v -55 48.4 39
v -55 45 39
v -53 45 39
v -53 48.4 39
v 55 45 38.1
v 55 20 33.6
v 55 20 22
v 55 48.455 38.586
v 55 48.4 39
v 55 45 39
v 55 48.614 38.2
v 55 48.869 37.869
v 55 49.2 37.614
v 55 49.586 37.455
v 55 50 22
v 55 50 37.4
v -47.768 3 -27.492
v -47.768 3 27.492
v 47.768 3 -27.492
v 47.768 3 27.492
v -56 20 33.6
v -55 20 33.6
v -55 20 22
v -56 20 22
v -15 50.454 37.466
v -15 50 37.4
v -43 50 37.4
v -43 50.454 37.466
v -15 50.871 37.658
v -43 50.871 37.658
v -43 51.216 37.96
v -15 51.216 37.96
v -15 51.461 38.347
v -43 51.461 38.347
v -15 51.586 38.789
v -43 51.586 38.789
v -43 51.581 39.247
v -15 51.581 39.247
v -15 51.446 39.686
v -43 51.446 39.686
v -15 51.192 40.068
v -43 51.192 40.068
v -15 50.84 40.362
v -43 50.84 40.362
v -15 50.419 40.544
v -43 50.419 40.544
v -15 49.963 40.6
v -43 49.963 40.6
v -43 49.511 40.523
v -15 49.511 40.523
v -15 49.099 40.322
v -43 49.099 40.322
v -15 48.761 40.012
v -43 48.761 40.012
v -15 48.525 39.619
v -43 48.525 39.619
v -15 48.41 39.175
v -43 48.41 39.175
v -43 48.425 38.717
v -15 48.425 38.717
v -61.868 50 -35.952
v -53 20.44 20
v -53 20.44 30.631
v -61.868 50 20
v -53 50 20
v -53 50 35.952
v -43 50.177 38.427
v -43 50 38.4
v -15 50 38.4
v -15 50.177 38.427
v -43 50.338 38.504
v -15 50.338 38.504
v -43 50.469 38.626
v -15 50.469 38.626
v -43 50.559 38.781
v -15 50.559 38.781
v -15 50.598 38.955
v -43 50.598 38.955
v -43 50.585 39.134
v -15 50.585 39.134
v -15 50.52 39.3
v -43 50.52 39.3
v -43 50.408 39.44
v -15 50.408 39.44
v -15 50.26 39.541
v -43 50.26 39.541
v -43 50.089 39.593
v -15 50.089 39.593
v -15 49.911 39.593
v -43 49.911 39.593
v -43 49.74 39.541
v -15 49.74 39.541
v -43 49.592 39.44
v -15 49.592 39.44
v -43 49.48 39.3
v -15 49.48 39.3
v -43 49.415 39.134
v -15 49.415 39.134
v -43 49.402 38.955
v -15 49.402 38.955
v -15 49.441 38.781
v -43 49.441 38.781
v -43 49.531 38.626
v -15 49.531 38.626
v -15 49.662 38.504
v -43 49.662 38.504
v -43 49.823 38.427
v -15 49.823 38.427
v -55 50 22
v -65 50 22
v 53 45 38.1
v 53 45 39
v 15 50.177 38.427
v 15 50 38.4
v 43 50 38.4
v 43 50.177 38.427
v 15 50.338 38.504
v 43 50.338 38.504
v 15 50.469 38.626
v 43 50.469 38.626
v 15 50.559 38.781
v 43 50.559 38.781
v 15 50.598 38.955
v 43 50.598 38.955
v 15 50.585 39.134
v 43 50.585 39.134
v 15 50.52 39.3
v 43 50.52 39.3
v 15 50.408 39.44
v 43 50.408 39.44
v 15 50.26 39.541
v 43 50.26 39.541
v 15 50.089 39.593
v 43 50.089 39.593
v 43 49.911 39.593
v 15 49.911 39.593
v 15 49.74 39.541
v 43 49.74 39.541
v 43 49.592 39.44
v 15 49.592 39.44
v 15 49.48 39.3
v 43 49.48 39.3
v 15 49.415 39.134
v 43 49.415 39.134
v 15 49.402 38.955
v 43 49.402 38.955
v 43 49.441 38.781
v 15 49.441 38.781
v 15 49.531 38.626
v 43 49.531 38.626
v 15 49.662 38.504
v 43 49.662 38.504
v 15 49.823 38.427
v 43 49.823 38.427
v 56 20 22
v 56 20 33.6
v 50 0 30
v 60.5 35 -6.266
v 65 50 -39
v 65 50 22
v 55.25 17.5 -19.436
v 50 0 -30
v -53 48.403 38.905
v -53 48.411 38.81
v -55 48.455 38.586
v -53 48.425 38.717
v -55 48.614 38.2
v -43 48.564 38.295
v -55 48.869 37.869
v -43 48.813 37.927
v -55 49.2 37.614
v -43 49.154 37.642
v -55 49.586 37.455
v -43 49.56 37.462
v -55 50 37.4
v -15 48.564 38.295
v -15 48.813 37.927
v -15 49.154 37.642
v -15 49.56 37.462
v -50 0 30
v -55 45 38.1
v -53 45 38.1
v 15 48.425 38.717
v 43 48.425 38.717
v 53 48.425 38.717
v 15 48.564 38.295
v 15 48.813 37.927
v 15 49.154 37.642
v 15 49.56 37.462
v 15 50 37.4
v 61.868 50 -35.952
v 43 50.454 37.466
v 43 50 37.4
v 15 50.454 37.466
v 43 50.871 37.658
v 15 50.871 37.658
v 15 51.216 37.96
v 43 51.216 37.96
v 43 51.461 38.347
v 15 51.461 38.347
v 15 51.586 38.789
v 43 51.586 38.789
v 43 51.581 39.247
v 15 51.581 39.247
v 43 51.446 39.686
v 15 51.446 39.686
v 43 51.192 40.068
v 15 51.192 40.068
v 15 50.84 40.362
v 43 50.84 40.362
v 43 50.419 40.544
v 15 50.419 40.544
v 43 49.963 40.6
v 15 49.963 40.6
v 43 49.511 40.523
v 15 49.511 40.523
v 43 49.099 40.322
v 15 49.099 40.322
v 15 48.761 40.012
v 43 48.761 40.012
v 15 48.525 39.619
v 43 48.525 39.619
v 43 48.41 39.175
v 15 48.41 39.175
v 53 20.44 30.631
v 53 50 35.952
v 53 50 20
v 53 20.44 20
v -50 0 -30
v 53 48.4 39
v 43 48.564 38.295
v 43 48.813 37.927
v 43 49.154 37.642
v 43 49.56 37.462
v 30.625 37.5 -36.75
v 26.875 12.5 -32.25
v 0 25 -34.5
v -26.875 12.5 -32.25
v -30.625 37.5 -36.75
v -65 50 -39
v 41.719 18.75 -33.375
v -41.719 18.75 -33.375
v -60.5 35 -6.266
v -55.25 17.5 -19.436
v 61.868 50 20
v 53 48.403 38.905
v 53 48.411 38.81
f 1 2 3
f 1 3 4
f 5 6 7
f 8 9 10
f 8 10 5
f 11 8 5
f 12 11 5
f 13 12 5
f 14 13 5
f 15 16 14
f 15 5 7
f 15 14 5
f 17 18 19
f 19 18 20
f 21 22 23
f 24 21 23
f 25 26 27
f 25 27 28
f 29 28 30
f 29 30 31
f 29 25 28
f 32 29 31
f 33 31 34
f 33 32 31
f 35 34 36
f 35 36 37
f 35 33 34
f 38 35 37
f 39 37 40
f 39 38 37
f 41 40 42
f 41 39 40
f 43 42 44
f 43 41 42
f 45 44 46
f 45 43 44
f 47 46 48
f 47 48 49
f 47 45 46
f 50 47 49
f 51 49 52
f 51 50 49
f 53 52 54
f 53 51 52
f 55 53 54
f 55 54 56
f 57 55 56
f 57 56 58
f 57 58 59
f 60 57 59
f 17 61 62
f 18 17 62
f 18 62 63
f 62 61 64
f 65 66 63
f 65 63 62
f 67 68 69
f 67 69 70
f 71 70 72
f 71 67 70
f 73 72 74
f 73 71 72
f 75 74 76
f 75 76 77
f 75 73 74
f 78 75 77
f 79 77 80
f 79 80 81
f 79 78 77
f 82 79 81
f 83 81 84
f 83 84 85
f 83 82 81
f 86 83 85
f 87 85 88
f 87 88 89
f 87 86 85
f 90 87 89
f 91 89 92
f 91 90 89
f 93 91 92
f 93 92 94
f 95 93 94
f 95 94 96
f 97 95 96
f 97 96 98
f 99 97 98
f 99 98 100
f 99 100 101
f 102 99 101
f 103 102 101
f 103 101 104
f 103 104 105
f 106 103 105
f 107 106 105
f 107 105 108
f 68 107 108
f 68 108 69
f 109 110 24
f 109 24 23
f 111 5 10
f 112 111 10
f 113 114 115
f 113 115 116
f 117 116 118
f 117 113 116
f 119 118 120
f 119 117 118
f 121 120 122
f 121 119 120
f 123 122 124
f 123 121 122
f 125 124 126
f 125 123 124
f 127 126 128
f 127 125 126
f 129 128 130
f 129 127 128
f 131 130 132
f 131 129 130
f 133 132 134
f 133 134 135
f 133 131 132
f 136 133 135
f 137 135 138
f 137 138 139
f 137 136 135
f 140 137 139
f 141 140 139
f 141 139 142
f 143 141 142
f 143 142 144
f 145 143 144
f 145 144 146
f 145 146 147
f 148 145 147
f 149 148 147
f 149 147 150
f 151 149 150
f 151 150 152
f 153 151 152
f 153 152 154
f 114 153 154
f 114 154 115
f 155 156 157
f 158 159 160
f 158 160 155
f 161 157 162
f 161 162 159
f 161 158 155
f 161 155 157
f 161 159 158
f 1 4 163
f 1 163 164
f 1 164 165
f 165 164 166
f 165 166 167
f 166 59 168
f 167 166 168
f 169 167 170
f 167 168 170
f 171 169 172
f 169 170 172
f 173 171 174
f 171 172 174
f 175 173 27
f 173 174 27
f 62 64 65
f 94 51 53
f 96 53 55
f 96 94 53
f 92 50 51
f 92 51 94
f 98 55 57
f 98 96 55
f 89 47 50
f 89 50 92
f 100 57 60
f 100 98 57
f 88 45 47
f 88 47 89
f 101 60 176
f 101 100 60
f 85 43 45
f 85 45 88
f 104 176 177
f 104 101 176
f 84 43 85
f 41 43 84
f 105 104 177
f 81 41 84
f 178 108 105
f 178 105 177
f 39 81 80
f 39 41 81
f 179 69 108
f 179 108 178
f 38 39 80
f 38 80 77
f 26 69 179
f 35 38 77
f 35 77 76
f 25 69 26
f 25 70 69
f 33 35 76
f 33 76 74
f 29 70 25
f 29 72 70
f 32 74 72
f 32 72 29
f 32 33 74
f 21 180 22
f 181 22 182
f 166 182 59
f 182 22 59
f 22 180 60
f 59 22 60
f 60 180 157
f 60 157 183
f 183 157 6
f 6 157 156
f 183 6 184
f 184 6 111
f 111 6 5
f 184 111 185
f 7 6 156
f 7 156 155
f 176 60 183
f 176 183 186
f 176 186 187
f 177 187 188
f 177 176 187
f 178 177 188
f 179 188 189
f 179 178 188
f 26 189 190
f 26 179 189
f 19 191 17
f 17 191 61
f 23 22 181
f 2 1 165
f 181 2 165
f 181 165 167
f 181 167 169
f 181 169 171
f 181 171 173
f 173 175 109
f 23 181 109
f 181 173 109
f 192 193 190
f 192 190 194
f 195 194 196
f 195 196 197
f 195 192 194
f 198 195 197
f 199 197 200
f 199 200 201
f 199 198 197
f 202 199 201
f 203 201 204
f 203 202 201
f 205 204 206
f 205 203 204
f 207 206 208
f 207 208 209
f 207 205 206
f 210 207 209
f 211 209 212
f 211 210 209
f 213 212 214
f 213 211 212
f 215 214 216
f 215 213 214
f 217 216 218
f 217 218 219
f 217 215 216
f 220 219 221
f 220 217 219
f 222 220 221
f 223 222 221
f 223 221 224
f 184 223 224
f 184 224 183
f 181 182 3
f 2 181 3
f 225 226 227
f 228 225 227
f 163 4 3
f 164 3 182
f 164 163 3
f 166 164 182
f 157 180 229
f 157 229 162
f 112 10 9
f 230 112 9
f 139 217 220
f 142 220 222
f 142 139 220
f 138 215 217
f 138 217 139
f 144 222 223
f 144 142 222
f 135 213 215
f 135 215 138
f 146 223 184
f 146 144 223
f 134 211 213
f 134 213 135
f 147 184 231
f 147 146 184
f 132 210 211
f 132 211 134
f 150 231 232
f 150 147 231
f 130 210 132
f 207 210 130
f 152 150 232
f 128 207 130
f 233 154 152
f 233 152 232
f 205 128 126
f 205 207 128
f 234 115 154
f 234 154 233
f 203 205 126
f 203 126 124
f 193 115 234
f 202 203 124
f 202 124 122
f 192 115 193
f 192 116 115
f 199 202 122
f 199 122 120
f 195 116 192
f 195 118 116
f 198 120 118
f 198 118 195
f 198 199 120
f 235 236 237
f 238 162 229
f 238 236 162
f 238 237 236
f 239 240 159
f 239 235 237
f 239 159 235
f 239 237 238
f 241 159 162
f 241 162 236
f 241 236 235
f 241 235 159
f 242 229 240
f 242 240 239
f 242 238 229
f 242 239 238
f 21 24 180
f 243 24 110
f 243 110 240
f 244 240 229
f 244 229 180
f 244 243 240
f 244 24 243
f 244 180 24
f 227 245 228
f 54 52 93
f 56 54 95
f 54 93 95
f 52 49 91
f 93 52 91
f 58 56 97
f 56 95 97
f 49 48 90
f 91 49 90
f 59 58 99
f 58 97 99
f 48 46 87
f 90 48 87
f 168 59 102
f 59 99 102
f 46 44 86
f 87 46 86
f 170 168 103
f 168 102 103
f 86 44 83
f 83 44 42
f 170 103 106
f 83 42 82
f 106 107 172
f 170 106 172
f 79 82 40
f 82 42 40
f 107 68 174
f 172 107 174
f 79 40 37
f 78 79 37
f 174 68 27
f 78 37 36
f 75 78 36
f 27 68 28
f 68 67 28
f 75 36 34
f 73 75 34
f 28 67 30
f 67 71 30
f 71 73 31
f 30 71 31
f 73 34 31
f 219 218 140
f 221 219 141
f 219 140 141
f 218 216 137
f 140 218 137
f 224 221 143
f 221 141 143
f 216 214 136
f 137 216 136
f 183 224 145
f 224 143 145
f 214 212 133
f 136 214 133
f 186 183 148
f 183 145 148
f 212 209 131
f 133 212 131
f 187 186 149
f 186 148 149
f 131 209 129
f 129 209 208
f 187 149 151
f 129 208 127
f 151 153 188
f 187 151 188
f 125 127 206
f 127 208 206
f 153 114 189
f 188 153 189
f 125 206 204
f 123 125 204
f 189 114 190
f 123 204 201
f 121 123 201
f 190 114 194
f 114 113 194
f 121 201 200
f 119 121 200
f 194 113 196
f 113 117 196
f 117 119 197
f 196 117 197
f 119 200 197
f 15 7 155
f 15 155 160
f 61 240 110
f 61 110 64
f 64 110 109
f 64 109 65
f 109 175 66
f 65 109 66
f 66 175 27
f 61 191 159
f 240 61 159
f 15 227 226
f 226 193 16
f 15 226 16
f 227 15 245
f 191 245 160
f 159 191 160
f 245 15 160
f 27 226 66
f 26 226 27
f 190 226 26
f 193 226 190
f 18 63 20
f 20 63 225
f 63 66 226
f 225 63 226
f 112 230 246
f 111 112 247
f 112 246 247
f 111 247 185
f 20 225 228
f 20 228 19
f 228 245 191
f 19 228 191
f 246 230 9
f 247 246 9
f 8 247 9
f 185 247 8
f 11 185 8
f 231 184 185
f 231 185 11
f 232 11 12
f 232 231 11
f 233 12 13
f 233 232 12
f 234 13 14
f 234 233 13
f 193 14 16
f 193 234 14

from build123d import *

# Parameters (mm, degrees)
SHELL_1_T                = -3
CUT_EXTRUDE_START        = 55
SKETCH_4_W               = 17
SKETCH_4_H               = 30
CUT_EXTRUDE_1_DEPTH      = 36.807488848
CUT_EXTRUDE_START_2      = -55
SKETCH_4_2_W             = 17
SKETCH_4_2_H             = 30
CUT_EXTRUDE_2_DEPTH      = 36.807488848
EXTRUDE_START            = 55
SKETCH_4_3_W             = 17
SKETCH_4_3_H             = 30
EXTRUDE_1_DEPTH          = 2
EXTRUDE_START_2          = -55
SKETCH_4_4_W             = 17
SKETCH_4_4_H             = 30
EXTRUDE_2_DEPTH          = 2
SKETCH_5_R               = 1.6
EXTRUDE_3_DEPTH          = 110
CUT_EXTRUDE_3_DEPTH      = 93.390042924
CUT_EXTRUDE_3_DEPTH_BACK = 93.390042924
SKETCH_5_3_R             = 0.6
CUT_EXTRUDE_4_DEPTH      = 15
CUT_EXTRUDE_4_DEPTH_BACK = 15
SKETCH_5_4_R             = 1.6
SKETCH_5_4_R_2           = 0.6
CUT_EXTRUDE_START_3      = -43
SKETCH_5_5_R             = 1.6
SKETCH_5_5_R_2           = 0.6
CUT_EXTRUDE_5_DEPTH      = 50.390042924
CUT_EXTRUDE_START_4      = 43
SKETCH_5_6_R             = 1.6
SKETCH_5_6_R_2           = 0.6
CUT_EXTRUDE_6_DEPTH      = 50.390042924
CUT_EXTRUDE_8_DEPTH      = 137.787865114
EXTRUDE_4_DEPTH          = 2


with BuildPart() as part:
    # 草图1 → 放样1 section 0
    with BuildSketch(Plane(origin=(0, 0, 0), x_dir=(1, 0, 0), z_dir=(0, 1, 0))):
        with BuildLine():
            Line((-50, -30), (50, -30))
            Line((50, -30), (50, 30))
            Line((50, 30), (-50, 30))
            Line((-50, 30), (-50, -30))
        make_face()
    # 草图2 → 放样1 section 1
    with BuildSketch(Plane(origin=(0, 50, 0), x_dir=(1, 0, 0), z_dir=(0, 1, 0))):
        with BuildLine():
            Line((-65, -39), (65, -39))
            Line((65, -39), (65, 39))
            Line((65, 39), (-65, 39))
            Line((-65, 39), (-65, -39))
        make_face()
    loft()

    # 抽壳1
    shell_1_openings = [part.faces().sort_by_distance(p)[0] for p in [
        (0, 50, 0),
    ]]
    offset(amount=SHELL_1_T, openings=shell_1_openings, kind=Kind.INTERSECTION)

    # 草图4 → 切除-拉伸1 (cut, through all)
    with BuildSketch(Plane(origin=(0, 0, 0), x_dir=(0, 0, -1), z_dir=(1, 0, 0)).offset(CUT_EXTRUDE_START)):
        with Locations((-30.5, 35)):
            Rectangle(SKETCH_4_W, SKETCH_4_H)
    extrude(amount=CUT_EXTRUDE_1_DEPTH, mode=Mode.SUBTRACT)

    # 草图4<2> → 切除-拉伸2 (cut, through all)
    with BuildSketch(Plane(origin=(0, 0, 0), x_dir=(0, 0, -1), z_dir=(1, 0, 0)).offset(CUT_EXTRUDE_START_2)):
        with Locations((-30.5, 35)):
            Rectangle(SKETCH_4_2_W, SKETCH_4_2_H)
    extrude(amount=-CUT_EXTRUDE_2_DEPTH, mode=Mode.SUBTRACT)

    # 草图4<3> → 凸台-拉伸1 (add)
    with BuildSketch(Plane(origin=(0, 0, 0), x_dir=(0, 0, -1), z_dir=(1, 0, 0)).offset(EXTRUDE_START)):
        with Locations((-30.5, 35)):
            Rectangle(SKETCH_4_3_W, SKETCH_4_3_H)
    extrude(amount=-EXTRUDE_1_DEPTH)

    # 草图4<4> → 凸台-拉伸2 (add)
    with BuildSketch(Plane(origin=(0, 0, 0), x_dir=(0, 0, -1), z_dir=(1, 0, 0)).offset(EXTRUDE_START_2)):
        with Locations((-30.5, 35)):
            Rectangle(SKETCH_4_4_W, SKETCH_4_4_H)
    extrude(amount=EXTRUDE_2_DEPTH)

    # 草图5 → 凸台-拉伸3 (add)
    with BuildSketch(Plane(origin=(0, 0, 0), x_dir=(0, 0, -1), z_dir=(1, 0, 0)).offset(EXTRUDE_START)):
        with Locations((-39, 50)):
            Circle(SKETCH_5_R)
    extrude(amount=-EXTRUDE_3_DEPTH)

    # 草图5<3> → 切除-拉伸3 (cut, two sides: drawn at the far end of the back side and taken through both)
    with BuildSketch(Plane(origin=(0, 0, 0), x_dir=(0, 0, -1), z_dir=(1, 0, 0)).offset(-CUT_EXTRUDE_3_DEPTH_BACK)):
        with Locations((-39, 50)):
            Circle(SKETCH_5_3_R)
    extrude(amount=CUT_EXTRUDE_3_DEPTH + CUT_EXTRUDE_3_DEPTH_BACK, mode=Mode.SUBTRACT)

    # 草图5<4> → 切除-拉伸4 (cut, two sides: drawn at the far end of the back side and taken through both)
    with BuildSketch(Plane(origin=(0, 0, 0), x_dir=(0, 0, -1), z_dir=(1, 0, 0)).offset(-CUT_EXTRUDE_4_DEPTH_BACK)):
        with Locations((-39, 50)):
            Circle(SKETCH_5_4_R)
        with Locations((-39, 50)):
            Circle(SKETCH_5_4_R_2, mode=Mode.SUBTRACT)
    extrude(amount=CUT_EXTRUDE_4_DEPTH + CUT_EXTRUDE_4_DEPTH_BACK, mode=Mode.SUBTRACT)

    # 草图5<5> → 切除-拉伸5 (cut, through all)
    with BuildSketch(Plane(origin=(0, 0, 0), x_dir=(0, 0, -1), z_dir=(1, 0, 0)).offset(CUT_EXTRUDE_START_3)):
        with Locations((-39, 50)):
            Circle(SKETCH_5_5_R)
        with Locations((-39, 50)):
            Circle(SKETCH_5_5_R_2, mode=Mode.SUBTRACT)
    extrude(amount=-CUT_EXTRUDE_5_DEPTH, mode=Mode.SUBTRACT)

    # 草图5<6> → 切除-拉伸6 (cut, through all)
    with BuildSketch(Plane(origin=(0, 0, 0), x_dir=(0, 0, -1), z_dir=(1, 0, 0)).offset(CUT_EXTRUDE_START_4)):
        with Locations((-39, 50)):
            Circle(SKETCH_5_6_R)
        with Locations((-39, 50)):
            Circle(SKETCH_5_6_R_2, mode=Mode.SUBTRACT)
    extrude(amount=CUT_EXTRUDE_6_DEPTH, mode=Mode.SUBTRACT)

    # 草图6 → 切除-拉伸8 (cut, through all)
    with BuildSketch(Plane(origin=(55, 0, 0), x_dir=(0, 0, -1), z_dir=(1, 0, 0))):
        Polygon((-39, 20), (-33.6, 20), (-38.1, 45), (-39, 45), align=None)
    extrude(amount=-CUT_EXTRUDE_8_DEPTH, mode=Mode.SUBTRACT)

    # 草图7 → 凸台-拉伸4 (add)
    with BuildSketch(Plane(origin=(0, 0, 22), x_dir=(-1, 0, 0), z_dir=(0, 0, -1))):
        Polygon((-65, 50), (-56, 20), (-53, 20), (-53, 50), align=None)
        Polygon((65, 50), (56, 20), (53, 20), (53, 50), align=None)
    extrude(amount=EXTRUDE_4_DEPTH)


solid = part.part
